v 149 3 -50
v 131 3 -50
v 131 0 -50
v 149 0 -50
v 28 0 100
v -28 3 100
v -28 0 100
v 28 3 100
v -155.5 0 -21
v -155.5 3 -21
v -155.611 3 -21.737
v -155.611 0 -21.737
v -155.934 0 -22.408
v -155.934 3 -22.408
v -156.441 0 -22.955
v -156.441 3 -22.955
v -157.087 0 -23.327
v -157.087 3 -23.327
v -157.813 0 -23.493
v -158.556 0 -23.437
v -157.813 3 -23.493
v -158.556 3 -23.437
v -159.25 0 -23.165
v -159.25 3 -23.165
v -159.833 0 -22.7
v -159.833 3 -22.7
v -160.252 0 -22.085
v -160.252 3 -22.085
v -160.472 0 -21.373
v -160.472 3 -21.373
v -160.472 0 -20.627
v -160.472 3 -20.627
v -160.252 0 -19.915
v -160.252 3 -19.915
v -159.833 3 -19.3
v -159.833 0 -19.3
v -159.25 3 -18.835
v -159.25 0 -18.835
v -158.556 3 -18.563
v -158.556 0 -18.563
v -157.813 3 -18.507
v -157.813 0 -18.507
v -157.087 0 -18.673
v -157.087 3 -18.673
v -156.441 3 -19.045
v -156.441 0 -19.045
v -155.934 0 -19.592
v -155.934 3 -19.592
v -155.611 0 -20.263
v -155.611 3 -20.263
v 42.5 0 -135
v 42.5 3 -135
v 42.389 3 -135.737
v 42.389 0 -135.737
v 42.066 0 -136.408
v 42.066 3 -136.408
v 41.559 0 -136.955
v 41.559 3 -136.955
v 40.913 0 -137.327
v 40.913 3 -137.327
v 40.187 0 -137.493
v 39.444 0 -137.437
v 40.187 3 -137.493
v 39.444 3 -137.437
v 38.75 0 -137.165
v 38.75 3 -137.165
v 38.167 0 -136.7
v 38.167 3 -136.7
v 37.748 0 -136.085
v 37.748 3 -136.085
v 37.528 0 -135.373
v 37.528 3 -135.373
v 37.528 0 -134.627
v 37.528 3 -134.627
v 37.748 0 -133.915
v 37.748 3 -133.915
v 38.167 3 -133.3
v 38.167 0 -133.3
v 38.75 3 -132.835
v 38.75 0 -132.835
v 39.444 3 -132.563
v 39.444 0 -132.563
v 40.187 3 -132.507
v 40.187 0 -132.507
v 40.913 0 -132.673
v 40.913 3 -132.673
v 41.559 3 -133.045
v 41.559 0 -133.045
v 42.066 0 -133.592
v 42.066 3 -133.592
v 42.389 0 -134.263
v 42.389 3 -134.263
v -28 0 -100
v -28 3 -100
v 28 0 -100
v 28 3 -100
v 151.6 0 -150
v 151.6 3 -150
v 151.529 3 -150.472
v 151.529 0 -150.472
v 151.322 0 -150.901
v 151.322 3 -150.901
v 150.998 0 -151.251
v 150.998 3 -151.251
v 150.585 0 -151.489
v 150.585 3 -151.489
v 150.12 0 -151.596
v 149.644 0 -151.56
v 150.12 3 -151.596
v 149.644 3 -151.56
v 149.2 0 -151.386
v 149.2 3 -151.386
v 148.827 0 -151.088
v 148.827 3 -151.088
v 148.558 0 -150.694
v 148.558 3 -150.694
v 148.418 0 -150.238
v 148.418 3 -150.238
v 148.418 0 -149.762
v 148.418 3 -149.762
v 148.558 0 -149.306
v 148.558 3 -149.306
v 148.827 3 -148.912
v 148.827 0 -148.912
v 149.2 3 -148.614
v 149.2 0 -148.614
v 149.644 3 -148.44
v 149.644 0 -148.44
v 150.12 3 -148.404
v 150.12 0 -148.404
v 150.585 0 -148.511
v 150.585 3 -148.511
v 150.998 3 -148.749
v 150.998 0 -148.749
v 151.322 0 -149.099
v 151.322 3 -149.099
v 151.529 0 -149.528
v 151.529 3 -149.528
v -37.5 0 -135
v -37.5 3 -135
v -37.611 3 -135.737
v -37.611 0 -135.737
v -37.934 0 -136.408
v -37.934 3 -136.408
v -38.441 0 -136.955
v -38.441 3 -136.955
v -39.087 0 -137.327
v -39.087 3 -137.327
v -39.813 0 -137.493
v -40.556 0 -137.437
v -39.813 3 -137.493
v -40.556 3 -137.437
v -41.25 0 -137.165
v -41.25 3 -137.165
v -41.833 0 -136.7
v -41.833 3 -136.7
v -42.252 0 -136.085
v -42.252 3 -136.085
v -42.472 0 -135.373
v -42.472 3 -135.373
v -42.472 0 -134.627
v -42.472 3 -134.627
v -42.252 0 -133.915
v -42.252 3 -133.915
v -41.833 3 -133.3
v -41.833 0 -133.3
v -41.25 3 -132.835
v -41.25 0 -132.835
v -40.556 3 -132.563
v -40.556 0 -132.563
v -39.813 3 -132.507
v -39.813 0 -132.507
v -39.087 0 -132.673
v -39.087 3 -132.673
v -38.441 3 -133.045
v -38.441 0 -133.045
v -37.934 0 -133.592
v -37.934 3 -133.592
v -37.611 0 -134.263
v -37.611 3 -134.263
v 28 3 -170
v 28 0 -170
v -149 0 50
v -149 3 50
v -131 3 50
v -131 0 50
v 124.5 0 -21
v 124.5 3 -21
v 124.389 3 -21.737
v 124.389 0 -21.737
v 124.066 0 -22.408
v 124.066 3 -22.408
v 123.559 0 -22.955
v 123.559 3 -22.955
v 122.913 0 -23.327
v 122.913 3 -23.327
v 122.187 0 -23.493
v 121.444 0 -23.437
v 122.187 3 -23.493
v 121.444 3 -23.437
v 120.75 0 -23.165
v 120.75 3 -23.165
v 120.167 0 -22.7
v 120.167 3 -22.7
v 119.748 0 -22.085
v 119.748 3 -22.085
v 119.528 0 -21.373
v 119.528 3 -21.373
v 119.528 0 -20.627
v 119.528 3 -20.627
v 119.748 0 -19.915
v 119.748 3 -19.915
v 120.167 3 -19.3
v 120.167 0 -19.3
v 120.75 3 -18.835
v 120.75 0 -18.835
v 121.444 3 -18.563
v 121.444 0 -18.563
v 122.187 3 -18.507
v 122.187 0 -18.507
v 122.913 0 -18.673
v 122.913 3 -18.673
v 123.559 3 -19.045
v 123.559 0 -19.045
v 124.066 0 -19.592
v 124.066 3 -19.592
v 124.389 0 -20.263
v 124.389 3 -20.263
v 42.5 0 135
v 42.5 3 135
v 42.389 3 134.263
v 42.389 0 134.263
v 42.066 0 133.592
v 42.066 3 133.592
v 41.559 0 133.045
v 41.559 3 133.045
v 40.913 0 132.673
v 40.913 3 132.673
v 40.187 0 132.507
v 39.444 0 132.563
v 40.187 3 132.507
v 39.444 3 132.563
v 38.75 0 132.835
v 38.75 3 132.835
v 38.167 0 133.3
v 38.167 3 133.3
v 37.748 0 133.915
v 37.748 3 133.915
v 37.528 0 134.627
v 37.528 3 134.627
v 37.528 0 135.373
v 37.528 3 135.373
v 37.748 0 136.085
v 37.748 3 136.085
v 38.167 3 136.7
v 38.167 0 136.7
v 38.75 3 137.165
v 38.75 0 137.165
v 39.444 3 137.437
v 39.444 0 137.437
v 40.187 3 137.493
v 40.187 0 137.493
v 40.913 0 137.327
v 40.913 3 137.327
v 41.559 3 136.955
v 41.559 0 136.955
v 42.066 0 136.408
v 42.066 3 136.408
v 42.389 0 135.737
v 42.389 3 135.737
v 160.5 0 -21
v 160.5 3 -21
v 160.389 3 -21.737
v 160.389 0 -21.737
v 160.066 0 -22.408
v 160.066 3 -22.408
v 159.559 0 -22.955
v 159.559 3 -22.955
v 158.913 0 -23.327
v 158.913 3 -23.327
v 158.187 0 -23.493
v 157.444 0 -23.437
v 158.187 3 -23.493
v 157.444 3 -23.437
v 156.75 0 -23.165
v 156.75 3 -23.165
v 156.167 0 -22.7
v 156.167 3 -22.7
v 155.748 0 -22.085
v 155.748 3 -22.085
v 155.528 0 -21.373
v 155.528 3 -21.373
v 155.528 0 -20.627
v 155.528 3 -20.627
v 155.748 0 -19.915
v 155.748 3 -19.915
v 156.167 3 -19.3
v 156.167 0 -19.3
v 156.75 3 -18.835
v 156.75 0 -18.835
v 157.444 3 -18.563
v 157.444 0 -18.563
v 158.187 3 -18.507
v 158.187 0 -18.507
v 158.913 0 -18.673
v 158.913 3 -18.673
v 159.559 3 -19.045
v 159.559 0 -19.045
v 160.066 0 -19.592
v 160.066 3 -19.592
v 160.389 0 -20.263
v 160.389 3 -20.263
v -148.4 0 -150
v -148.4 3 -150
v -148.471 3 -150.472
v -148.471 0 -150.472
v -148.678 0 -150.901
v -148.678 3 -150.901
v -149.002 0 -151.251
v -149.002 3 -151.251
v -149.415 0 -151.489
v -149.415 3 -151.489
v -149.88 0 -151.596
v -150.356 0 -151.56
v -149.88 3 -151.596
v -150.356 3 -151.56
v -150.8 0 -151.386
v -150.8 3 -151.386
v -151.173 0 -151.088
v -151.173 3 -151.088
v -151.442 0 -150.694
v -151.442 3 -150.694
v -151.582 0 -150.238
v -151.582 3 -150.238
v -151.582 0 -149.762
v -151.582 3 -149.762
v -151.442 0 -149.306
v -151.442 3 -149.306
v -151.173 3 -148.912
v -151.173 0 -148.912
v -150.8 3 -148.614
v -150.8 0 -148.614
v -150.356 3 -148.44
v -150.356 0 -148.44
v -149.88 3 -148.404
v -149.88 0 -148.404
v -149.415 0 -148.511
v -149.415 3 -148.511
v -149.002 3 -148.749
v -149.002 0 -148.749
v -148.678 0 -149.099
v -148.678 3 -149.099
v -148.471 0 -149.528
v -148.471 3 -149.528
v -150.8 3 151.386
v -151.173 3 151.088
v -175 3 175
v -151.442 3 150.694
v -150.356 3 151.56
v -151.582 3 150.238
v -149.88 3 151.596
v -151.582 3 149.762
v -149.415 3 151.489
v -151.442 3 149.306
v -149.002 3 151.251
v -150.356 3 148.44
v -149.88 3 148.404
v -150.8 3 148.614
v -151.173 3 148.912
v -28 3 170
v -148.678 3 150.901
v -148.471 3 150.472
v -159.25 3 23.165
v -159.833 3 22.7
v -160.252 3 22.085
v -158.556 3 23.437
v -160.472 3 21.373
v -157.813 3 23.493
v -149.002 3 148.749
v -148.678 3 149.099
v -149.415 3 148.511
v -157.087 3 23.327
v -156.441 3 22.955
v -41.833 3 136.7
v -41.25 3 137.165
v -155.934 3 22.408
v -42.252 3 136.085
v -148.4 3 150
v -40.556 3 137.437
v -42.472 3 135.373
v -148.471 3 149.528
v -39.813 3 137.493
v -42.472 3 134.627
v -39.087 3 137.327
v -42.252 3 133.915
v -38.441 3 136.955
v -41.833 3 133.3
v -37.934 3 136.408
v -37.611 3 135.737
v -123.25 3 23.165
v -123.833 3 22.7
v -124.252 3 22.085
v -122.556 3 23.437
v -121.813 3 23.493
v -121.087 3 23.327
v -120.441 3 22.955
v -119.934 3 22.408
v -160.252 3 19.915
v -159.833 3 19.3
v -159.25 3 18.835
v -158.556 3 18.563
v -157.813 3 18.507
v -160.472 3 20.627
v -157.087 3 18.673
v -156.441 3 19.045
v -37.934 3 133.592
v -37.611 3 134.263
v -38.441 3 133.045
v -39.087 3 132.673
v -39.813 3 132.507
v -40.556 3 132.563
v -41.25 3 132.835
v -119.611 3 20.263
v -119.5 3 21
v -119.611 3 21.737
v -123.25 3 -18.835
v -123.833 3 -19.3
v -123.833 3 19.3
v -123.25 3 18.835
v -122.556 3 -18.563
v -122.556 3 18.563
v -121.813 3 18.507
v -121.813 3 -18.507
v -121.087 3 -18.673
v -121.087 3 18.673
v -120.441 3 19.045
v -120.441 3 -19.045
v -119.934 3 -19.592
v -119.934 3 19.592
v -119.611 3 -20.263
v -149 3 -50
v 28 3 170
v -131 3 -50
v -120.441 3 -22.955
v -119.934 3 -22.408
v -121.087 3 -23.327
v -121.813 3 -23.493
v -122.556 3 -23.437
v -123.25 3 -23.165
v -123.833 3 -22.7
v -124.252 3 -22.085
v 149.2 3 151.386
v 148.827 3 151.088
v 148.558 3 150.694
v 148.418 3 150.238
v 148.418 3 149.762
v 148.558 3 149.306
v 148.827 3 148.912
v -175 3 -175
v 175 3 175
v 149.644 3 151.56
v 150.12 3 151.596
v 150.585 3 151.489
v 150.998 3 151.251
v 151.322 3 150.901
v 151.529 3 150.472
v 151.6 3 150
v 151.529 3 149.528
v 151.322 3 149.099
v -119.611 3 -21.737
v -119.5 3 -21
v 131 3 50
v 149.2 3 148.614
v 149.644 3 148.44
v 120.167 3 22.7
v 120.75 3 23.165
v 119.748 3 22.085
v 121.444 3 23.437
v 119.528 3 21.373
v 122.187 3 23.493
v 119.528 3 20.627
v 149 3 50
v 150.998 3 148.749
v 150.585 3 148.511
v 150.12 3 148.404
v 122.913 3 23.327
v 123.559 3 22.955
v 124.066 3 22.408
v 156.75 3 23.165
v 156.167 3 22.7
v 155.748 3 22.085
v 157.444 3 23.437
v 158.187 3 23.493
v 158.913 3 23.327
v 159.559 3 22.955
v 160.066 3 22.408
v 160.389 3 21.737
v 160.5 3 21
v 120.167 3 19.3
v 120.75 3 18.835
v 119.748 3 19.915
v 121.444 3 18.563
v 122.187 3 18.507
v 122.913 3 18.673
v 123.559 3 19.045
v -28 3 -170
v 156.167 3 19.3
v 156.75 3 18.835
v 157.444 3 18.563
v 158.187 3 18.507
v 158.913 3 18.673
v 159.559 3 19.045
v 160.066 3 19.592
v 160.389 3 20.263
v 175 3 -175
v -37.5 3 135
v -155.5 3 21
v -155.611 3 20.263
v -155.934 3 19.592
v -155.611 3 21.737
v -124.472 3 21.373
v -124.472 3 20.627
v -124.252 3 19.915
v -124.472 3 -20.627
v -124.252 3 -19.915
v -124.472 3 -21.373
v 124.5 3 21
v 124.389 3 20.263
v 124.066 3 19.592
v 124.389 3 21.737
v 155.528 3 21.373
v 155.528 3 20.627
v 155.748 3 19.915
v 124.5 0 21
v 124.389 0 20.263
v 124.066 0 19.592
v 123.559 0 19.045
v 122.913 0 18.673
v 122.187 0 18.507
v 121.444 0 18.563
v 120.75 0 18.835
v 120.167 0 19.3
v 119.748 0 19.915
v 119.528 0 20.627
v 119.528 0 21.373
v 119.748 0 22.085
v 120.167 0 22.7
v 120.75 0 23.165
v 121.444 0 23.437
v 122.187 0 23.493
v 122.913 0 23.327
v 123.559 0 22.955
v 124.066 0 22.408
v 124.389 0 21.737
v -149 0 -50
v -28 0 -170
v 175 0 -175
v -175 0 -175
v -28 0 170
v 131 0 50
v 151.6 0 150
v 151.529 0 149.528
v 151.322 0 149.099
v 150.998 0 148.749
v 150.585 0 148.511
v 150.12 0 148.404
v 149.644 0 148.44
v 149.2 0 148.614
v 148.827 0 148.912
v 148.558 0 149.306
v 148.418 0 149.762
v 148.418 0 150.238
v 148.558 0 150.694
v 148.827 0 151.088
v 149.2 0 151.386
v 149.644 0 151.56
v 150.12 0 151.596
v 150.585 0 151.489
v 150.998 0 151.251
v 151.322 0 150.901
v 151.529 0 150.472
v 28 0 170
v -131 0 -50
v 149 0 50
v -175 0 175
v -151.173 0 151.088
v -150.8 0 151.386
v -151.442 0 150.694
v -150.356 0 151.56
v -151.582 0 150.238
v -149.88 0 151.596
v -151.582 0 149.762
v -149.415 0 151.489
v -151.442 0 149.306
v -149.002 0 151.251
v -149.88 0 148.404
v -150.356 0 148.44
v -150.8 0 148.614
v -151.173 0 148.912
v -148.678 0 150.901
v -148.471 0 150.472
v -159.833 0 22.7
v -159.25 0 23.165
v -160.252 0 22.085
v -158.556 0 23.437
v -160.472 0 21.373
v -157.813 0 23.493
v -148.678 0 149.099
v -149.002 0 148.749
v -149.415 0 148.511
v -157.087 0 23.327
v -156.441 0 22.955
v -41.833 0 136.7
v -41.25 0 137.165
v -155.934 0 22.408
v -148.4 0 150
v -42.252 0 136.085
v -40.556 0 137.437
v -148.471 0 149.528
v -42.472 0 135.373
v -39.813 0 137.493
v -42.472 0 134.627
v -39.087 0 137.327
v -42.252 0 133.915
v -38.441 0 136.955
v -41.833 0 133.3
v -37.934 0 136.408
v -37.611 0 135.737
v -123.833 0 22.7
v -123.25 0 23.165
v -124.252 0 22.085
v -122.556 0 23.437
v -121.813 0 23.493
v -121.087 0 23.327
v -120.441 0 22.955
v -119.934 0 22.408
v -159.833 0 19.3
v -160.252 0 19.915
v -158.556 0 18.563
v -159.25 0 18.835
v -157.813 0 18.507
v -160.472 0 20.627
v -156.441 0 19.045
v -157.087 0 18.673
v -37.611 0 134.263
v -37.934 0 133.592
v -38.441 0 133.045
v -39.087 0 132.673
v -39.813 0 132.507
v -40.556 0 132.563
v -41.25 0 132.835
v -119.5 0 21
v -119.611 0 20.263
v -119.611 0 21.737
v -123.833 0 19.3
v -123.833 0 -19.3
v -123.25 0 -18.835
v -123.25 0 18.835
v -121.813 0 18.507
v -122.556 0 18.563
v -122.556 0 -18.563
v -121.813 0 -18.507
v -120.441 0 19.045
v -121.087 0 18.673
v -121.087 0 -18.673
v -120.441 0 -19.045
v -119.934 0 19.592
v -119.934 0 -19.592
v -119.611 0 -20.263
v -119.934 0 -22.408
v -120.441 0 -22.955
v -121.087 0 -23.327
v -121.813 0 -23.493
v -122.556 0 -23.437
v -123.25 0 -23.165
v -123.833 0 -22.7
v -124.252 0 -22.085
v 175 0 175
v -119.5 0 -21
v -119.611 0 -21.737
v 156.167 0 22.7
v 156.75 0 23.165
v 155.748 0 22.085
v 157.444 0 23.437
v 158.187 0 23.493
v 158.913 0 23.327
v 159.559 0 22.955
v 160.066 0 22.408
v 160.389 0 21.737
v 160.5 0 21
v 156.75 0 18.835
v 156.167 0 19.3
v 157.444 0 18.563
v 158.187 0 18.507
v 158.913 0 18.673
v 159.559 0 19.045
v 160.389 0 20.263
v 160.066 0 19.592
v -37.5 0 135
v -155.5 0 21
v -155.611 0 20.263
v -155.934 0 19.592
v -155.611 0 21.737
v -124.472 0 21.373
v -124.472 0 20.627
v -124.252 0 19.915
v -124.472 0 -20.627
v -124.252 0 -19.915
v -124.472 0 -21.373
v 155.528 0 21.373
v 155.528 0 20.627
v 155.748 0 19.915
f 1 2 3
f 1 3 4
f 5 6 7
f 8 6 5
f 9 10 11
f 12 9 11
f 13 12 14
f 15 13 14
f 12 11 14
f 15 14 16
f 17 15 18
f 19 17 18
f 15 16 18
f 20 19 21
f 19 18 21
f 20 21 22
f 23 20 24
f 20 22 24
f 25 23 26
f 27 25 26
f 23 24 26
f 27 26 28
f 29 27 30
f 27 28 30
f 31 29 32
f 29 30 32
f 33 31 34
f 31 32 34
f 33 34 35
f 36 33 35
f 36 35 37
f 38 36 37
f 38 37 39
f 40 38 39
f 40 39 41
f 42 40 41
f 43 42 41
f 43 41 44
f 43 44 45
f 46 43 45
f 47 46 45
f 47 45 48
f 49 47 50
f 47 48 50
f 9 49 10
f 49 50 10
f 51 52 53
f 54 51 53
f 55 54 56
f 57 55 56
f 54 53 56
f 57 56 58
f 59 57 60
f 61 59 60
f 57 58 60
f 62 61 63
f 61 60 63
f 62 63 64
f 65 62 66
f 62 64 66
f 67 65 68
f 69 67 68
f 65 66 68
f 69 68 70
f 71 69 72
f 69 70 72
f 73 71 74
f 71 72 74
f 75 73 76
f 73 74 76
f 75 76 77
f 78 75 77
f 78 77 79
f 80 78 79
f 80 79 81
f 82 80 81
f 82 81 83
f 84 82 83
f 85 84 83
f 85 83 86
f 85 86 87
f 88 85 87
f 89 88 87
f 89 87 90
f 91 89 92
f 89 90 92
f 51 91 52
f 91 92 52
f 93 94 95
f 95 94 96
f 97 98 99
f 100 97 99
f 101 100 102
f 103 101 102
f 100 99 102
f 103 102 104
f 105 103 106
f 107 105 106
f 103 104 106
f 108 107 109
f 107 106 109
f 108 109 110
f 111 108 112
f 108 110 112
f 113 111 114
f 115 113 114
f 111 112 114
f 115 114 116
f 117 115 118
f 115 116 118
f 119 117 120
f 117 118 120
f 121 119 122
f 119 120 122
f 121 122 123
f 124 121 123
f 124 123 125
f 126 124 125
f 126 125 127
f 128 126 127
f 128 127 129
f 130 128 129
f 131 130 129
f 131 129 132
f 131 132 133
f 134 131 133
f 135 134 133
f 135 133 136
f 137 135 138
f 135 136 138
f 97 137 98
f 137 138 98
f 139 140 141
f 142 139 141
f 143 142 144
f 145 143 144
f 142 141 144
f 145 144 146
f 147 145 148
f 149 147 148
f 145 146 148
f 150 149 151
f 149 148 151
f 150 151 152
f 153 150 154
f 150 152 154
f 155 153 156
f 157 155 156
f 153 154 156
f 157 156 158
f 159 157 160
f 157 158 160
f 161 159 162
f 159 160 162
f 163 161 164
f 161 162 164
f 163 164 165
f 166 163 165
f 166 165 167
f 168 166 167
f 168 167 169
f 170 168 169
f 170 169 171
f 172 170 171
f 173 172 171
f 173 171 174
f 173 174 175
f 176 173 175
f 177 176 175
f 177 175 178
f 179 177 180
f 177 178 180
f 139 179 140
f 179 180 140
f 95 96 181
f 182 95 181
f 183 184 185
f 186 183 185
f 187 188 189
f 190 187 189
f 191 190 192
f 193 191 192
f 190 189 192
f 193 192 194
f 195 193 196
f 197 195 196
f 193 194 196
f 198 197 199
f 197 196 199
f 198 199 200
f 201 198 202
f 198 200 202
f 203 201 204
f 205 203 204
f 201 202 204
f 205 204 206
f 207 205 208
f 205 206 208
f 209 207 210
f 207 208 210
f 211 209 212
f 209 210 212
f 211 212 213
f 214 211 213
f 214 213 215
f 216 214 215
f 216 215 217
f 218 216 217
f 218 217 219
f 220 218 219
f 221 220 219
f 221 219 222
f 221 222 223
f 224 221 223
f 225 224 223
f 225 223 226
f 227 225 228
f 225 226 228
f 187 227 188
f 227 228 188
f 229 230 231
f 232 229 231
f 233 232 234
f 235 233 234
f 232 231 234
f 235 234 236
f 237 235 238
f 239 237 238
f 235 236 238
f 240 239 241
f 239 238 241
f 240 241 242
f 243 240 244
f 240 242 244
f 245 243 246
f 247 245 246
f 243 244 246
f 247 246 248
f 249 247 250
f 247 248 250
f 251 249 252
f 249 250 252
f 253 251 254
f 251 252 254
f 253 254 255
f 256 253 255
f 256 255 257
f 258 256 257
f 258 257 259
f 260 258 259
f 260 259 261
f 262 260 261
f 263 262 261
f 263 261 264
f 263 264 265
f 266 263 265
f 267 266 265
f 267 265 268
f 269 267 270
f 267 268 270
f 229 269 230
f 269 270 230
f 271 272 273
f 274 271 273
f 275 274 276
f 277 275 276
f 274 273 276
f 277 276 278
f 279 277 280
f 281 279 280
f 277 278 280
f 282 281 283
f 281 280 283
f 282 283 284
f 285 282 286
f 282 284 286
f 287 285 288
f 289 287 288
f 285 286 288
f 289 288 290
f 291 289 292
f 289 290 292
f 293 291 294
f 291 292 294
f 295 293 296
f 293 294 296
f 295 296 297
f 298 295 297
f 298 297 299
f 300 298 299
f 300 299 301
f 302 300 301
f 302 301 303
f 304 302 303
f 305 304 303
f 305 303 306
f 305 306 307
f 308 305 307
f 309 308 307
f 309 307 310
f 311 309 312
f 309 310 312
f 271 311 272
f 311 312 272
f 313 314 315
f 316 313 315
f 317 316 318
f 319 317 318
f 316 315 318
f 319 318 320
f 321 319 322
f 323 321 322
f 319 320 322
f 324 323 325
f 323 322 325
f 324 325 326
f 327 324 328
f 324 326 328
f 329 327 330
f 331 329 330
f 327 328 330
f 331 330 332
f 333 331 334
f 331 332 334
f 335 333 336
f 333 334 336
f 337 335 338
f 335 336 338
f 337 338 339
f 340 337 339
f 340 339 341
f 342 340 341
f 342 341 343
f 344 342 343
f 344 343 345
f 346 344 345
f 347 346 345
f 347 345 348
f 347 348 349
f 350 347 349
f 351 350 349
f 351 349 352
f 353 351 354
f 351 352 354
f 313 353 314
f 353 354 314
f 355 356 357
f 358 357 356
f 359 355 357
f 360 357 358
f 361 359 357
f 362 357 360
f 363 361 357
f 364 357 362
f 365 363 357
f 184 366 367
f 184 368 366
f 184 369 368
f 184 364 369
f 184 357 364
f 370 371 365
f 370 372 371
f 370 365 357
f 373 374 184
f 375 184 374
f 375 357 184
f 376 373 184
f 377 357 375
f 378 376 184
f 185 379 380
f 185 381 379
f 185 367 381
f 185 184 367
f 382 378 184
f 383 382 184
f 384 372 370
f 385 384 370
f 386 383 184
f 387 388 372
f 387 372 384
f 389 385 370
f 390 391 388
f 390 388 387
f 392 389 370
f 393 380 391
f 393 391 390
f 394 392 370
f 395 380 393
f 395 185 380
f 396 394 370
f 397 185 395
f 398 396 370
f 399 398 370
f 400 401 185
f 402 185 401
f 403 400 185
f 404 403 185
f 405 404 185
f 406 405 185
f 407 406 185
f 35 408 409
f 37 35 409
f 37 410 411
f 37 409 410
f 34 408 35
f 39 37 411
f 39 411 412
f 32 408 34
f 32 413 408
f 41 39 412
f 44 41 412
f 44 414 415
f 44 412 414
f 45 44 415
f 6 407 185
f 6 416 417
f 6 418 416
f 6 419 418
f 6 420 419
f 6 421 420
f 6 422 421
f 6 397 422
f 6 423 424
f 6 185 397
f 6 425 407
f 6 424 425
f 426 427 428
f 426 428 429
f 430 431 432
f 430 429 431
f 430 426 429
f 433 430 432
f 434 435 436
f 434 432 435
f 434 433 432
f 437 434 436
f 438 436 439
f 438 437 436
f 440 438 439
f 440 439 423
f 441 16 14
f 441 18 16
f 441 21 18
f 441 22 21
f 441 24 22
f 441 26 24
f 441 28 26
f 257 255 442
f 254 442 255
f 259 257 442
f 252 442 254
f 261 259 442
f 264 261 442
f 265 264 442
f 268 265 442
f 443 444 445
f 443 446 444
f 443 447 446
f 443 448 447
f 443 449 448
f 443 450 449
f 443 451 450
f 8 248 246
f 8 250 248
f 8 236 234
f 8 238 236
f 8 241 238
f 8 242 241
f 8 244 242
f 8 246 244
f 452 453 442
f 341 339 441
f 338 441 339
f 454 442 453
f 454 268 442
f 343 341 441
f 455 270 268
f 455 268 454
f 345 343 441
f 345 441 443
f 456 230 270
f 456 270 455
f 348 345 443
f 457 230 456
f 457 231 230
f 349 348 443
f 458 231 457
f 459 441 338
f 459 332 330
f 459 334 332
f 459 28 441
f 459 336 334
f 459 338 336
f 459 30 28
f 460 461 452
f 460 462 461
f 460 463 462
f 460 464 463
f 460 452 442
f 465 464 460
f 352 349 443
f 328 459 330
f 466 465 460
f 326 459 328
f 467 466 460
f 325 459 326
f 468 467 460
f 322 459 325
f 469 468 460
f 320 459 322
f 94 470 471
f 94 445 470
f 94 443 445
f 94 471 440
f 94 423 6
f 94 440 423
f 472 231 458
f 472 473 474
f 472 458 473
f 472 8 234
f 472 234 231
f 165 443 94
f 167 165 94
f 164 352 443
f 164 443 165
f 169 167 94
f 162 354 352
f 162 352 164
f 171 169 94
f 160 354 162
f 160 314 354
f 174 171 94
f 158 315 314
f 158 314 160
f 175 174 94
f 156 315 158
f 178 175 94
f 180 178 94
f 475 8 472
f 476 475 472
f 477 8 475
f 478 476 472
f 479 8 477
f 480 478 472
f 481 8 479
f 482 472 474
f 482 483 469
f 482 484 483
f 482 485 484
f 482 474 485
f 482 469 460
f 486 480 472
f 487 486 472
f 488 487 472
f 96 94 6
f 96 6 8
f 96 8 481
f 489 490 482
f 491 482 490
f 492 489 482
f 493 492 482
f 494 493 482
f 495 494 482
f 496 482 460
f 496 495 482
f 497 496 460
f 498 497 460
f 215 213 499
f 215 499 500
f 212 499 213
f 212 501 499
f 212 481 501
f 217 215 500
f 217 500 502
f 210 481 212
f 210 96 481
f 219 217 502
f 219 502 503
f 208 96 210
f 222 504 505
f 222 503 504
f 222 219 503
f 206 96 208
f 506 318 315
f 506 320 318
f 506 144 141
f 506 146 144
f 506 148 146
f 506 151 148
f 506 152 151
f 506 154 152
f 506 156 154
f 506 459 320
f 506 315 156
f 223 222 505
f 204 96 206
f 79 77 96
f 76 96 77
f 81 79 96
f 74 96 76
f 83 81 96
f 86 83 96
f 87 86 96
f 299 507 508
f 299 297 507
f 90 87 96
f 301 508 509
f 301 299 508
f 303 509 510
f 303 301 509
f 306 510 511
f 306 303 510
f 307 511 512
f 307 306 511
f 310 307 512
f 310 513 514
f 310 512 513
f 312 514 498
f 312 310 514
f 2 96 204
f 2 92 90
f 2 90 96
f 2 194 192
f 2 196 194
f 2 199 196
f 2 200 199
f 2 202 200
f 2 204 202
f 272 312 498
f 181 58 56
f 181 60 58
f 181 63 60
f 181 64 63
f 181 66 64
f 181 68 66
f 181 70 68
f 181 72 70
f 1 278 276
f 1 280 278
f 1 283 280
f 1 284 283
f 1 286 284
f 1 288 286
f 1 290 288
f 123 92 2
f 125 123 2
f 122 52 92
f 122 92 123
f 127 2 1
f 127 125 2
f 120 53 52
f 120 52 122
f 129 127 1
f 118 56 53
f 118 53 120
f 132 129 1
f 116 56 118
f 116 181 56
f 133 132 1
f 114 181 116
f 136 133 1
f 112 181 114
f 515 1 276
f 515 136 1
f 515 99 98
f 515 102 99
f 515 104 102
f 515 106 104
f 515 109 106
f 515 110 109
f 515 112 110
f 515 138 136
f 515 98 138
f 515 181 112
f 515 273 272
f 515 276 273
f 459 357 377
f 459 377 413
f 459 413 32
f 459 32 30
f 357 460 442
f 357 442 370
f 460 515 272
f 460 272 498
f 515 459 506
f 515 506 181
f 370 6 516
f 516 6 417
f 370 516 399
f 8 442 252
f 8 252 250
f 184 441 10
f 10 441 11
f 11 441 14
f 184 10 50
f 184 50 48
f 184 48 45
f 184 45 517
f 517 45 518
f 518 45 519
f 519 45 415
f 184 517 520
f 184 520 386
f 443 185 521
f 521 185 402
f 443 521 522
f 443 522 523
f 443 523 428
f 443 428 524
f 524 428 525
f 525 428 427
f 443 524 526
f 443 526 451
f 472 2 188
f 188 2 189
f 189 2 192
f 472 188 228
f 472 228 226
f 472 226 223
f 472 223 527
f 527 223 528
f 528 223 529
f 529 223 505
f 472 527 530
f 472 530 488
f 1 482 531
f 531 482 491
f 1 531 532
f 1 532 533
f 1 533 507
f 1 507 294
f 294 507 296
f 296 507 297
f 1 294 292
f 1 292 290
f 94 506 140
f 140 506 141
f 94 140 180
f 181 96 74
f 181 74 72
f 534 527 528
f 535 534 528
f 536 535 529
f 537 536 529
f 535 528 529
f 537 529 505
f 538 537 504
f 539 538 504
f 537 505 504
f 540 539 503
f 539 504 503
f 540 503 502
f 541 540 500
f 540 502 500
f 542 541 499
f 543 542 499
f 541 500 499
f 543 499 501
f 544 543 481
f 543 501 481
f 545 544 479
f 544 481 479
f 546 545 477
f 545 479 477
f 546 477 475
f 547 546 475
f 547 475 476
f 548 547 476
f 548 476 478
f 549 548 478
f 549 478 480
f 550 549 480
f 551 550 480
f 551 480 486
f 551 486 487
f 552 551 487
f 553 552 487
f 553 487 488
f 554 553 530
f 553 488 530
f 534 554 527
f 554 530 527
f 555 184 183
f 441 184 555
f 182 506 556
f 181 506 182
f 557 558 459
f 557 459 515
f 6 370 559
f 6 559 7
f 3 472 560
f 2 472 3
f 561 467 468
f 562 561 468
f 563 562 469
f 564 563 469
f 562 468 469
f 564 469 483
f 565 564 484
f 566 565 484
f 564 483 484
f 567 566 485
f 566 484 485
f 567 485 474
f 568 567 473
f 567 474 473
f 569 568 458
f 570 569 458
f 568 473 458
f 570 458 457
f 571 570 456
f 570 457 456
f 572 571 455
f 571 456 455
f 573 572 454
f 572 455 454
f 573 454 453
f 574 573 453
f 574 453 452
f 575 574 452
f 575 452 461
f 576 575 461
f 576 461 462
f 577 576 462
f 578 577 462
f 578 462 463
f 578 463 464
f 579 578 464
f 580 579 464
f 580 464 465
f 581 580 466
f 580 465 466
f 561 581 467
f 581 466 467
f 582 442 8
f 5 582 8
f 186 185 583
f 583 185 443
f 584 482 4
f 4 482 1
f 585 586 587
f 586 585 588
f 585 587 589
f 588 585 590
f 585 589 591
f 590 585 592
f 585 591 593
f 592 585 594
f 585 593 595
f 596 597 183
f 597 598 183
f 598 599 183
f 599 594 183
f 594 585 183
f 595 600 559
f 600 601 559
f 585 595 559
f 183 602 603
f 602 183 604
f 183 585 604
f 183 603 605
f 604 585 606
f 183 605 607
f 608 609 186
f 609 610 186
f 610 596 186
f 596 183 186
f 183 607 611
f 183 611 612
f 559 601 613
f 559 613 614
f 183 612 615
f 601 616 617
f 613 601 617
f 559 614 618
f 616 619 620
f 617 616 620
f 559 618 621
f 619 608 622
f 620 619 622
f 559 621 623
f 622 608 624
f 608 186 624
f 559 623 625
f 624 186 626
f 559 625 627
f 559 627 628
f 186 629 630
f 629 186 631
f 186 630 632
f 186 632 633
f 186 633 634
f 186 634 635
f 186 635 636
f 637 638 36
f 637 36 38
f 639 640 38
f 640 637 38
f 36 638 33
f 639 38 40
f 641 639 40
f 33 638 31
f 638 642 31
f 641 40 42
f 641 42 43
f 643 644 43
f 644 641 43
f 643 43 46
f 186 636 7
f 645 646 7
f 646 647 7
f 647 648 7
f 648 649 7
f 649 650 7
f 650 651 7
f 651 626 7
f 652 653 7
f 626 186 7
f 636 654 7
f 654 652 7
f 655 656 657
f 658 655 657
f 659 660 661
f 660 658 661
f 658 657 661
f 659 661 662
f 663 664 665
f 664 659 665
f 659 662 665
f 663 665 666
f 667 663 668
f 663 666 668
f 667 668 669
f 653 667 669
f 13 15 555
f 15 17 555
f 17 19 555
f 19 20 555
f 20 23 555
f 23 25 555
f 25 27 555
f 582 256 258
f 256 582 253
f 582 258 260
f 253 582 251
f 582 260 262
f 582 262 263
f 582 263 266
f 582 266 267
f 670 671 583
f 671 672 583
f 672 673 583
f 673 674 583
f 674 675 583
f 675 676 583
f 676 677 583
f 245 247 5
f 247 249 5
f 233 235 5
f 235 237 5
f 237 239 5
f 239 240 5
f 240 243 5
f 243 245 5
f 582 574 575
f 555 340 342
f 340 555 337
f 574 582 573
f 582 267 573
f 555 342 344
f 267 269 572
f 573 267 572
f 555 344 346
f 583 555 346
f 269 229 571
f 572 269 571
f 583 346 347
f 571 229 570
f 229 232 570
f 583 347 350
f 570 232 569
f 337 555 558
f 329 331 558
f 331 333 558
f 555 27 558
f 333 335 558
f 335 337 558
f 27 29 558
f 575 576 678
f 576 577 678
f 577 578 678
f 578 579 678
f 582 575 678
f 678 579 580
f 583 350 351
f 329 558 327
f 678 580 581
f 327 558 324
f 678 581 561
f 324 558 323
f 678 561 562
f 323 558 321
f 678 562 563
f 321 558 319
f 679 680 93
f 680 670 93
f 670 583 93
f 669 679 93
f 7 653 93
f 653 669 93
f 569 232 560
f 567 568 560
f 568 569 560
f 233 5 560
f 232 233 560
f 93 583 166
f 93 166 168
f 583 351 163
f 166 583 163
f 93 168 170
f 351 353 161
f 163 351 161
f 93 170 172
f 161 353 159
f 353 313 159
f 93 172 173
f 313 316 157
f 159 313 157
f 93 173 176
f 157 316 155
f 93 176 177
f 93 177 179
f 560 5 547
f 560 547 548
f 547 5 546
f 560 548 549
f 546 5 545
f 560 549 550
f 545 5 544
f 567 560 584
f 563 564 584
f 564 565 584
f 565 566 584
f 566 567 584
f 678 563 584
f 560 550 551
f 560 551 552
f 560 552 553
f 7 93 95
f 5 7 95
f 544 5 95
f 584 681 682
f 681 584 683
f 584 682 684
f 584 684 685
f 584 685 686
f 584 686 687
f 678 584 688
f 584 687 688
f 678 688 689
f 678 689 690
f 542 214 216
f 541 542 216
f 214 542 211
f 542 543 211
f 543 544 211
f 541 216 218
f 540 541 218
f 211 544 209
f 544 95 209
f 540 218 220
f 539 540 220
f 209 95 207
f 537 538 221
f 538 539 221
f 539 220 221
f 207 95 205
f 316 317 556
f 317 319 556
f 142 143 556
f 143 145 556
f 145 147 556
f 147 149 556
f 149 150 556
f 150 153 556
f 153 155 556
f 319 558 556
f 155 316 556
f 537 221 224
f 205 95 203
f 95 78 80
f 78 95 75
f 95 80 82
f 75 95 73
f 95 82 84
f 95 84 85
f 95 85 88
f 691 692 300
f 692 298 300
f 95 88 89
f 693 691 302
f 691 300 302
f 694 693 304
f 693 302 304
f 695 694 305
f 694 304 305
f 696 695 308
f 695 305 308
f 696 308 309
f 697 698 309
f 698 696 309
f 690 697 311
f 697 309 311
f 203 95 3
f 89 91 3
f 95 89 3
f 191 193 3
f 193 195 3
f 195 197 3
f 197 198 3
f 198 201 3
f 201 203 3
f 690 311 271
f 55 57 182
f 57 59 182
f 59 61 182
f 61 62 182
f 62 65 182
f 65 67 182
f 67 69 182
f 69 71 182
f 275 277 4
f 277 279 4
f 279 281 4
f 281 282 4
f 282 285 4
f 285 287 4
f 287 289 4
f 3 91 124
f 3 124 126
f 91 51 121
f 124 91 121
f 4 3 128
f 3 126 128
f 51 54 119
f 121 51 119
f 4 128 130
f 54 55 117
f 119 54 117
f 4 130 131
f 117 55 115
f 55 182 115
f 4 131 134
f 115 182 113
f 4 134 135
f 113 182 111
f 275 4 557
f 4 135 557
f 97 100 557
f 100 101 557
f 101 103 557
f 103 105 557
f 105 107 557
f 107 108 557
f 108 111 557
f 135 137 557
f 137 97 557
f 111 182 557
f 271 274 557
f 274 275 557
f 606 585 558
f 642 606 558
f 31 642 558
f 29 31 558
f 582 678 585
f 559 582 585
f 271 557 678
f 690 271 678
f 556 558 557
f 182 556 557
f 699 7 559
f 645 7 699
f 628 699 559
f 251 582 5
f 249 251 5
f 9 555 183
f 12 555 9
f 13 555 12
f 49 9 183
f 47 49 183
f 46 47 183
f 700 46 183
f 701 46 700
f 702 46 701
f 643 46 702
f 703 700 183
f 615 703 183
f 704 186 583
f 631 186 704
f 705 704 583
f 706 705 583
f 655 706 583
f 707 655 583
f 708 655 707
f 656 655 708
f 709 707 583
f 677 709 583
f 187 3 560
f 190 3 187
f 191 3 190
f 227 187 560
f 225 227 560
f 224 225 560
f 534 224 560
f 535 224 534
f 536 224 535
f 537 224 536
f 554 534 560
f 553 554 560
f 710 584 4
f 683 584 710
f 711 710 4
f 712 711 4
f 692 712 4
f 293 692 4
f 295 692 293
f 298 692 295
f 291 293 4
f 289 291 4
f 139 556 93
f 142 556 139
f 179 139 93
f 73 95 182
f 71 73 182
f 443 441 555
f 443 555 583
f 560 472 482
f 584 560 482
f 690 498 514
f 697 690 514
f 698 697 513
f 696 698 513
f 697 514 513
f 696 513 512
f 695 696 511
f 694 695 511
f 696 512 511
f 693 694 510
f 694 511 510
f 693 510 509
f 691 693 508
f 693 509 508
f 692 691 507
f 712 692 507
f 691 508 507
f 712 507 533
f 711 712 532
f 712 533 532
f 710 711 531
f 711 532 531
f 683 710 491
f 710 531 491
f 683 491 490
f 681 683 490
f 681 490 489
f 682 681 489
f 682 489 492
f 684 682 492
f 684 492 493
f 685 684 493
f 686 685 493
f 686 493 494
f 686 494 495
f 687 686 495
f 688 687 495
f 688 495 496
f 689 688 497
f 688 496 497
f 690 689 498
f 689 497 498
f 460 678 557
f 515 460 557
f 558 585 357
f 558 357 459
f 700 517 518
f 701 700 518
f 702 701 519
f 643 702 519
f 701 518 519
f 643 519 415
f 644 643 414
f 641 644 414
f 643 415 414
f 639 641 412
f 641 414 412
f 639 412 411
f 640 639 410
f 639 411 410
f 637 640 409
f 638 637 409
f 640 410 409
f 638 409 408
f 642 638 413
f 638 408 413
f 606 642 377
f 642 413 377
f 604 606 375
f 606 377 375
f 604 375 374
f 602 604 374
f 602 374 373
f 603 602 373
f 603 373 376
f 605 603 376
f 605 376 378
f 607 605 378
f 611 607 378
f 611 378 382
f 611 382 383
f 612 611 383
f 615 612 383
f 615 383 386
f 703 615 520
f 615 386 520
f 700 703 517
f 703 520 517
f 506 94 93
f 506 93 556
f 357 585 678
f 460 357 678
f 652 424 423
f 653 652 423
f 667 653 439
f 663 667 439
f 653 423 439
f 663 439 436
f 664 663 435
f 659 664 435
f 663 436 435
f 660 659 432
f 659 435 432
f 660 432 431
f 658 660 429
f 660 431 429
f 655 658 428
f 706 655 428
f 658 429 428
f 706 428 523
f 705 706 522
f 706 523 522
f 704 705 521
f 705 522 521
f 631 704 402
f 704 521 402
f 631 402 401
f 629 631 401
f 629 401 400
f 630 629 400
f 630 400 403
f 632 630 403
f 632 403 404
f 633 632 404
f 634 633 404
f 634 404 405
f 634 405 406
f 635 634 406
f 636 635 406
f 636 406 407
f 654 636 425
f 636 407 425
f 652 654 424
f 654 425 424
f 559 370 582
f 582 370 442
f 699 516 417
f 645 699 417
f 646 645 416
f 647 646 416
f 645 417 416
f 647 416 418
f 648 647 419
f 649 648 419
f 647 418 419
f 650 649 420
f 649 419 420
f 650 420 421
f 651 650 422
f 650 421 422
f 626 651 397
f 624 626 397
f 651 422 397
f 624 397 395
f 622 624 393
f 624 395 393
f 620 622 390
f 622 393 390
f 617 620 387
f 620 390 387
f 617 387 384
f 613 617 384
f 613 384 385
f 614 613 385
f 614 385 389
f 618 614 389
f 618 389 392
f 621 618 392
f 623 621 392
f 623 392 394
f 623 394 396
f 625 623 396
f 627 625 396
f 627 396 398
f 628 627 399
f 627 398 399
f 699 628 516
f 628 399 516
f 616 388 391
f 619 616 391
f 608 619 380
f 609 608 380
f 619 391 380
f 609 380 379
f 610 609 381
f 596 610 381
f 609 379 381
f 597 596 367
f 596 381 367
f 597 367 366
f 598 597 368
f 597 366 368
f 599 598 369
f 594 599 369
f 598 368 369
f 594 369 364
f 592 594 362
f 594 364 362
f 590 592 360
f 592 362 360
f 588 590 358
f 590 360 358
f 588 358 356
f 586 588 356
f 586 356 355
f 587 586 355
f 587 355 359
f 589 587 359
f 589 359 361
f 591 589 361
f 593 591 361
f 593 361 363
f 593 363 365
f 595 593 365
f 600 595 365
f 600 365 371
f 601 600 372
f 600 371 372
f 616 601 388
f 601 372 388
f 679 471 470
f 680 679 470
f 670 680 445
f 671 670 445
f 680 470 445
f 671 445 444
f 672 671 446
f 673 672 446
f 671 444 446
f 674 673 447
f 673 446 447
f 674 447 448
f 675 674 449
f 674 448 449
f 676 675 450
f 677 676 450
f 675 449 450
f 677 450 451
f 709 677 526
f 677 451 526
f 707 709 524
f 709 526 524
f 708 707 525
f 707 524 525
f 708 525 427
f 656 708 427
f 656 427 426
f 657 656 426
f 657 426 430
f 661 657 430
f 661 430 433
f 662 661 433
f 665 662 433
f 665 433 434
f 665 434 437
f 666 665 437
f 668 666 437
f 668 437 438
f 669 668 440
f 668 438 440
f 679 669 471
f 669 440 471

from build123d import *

# Parameters (mm, degrees)
SKETCH1_W           = 350
SKETCH1_H           = 350
BOSS_EXTRUDE1_DEPTH = 3
SKETCH3_W           = 18
SKETCH3_H           = 100
CUT_EXTRUDE1_DEPTH  = 3
SKETCH4_W           = 56
SKETCH4_H           = 70
CUT_EXTRUDE2_DEPTH  = 3
SKETCH5_R           = 2.5
SKETCH5_R_2         = 1.6
CUT_EXTRUDE3_DEPTH  = 3


with BuildPart() as part:
    # Sketch1 → Boss-Extrude1 (new body)
    with BuildSketch(Plane(origin=(0, 0, 0), x_dir=(1, 0, 0), z_dir=(0, 1, 0))):
        Rectangle(SKETCH1_W, SKETCH1_H)
    extrude(amount=BOSS_EXTRUDE1_DEPTH)

    # Sketch3 → Cut-Extrude1 (cut)
    with BuildSketch(Plane(origin=(0, 3, 0), x_dir=(1, 0, 0), z_dir=(0, 1, 0))):
        with Locations((-140, 0)):
            Rectangle(SKETCH3_W, SKETCH3_H)
        with Locations((140, 0)):
            Rectangle(SKETCH3_W, SKETCH3_H)
    extrude(amount=-CUT_EXTRUDE1_DEPTH, mode=Mode.SUBTRACT)

    # Sketch4 → Cut-Extrude2 (cut)
    with BuildSketch(Plane(origin=(0, 3, 0), x_dir=(1, 0, 0), z_dir=(0, 1, 0))):
        with Locations((0, 135.000000303)):
            Rectangle(SKETCH4_W, SKETCH4_H)
        with Locations((0, -135.000003084)):
            Rectangle(SKETCH4_W, SKETCH4_H)
    extrude(amount=-CUT_EXTRUDE2_DEPTH, mode=Mode.SUBTRACT)

    # Sketch5 → Cut-Extrude3 (cut)
    with BuildSketch(Plane(origin=(0, 3, 0), x_dir=(1, 0, 0), z_dir=(0, 1, 0))):
        with Locations((-158, 21)):
            Circle(SKETCH5_R)
        with Locations((-158, -21)):
            Circle(SKETCH5_R)
        with Locations((-122, 21)):
            Circle(SKETCH5_R)
        with Locations((-122, -21)):
            Circle(SKETCH5_R)
        with Locations((158, 21)):
            Circle(SKETCH5_R)
        with Locations((158, -21)):
            Circle(SKETCH5_R)
        with Locations((122, 21)):
            Circle(SKETCH5_R)
        with Locations((122, -21)):
            Circle(SKETCH5_R)
        with Locations((-39.999996759, -135.000003084)):
            Circle(SKETCH5_R)
        with Locations((39.999996759, -135.000003084)):
            Circle(SKETCH5_R)
        with Locations((-39.999996759, 135.000000303)):
            Circle(SKETCH5_R)
        with Locations((39.999996759, 135.000000303)):
            Circle(SKETCH5_R)
        with Locations((-150, 150)):
            Circle(SKETCH5_R_2)
        with Locations((150, 150)):
            Circle(SKETCH5_R_2)
        with Locations((150, -150)):
            Circle(SKETCH5_R_2)
        with Locations((-150, -150)):
            Circle(SKETCH5_R_2)
    extrude(amount=-CUT_EXTRUDE3_DEPTH, mode=Mode.SUBTRACT)


solid = part.part
